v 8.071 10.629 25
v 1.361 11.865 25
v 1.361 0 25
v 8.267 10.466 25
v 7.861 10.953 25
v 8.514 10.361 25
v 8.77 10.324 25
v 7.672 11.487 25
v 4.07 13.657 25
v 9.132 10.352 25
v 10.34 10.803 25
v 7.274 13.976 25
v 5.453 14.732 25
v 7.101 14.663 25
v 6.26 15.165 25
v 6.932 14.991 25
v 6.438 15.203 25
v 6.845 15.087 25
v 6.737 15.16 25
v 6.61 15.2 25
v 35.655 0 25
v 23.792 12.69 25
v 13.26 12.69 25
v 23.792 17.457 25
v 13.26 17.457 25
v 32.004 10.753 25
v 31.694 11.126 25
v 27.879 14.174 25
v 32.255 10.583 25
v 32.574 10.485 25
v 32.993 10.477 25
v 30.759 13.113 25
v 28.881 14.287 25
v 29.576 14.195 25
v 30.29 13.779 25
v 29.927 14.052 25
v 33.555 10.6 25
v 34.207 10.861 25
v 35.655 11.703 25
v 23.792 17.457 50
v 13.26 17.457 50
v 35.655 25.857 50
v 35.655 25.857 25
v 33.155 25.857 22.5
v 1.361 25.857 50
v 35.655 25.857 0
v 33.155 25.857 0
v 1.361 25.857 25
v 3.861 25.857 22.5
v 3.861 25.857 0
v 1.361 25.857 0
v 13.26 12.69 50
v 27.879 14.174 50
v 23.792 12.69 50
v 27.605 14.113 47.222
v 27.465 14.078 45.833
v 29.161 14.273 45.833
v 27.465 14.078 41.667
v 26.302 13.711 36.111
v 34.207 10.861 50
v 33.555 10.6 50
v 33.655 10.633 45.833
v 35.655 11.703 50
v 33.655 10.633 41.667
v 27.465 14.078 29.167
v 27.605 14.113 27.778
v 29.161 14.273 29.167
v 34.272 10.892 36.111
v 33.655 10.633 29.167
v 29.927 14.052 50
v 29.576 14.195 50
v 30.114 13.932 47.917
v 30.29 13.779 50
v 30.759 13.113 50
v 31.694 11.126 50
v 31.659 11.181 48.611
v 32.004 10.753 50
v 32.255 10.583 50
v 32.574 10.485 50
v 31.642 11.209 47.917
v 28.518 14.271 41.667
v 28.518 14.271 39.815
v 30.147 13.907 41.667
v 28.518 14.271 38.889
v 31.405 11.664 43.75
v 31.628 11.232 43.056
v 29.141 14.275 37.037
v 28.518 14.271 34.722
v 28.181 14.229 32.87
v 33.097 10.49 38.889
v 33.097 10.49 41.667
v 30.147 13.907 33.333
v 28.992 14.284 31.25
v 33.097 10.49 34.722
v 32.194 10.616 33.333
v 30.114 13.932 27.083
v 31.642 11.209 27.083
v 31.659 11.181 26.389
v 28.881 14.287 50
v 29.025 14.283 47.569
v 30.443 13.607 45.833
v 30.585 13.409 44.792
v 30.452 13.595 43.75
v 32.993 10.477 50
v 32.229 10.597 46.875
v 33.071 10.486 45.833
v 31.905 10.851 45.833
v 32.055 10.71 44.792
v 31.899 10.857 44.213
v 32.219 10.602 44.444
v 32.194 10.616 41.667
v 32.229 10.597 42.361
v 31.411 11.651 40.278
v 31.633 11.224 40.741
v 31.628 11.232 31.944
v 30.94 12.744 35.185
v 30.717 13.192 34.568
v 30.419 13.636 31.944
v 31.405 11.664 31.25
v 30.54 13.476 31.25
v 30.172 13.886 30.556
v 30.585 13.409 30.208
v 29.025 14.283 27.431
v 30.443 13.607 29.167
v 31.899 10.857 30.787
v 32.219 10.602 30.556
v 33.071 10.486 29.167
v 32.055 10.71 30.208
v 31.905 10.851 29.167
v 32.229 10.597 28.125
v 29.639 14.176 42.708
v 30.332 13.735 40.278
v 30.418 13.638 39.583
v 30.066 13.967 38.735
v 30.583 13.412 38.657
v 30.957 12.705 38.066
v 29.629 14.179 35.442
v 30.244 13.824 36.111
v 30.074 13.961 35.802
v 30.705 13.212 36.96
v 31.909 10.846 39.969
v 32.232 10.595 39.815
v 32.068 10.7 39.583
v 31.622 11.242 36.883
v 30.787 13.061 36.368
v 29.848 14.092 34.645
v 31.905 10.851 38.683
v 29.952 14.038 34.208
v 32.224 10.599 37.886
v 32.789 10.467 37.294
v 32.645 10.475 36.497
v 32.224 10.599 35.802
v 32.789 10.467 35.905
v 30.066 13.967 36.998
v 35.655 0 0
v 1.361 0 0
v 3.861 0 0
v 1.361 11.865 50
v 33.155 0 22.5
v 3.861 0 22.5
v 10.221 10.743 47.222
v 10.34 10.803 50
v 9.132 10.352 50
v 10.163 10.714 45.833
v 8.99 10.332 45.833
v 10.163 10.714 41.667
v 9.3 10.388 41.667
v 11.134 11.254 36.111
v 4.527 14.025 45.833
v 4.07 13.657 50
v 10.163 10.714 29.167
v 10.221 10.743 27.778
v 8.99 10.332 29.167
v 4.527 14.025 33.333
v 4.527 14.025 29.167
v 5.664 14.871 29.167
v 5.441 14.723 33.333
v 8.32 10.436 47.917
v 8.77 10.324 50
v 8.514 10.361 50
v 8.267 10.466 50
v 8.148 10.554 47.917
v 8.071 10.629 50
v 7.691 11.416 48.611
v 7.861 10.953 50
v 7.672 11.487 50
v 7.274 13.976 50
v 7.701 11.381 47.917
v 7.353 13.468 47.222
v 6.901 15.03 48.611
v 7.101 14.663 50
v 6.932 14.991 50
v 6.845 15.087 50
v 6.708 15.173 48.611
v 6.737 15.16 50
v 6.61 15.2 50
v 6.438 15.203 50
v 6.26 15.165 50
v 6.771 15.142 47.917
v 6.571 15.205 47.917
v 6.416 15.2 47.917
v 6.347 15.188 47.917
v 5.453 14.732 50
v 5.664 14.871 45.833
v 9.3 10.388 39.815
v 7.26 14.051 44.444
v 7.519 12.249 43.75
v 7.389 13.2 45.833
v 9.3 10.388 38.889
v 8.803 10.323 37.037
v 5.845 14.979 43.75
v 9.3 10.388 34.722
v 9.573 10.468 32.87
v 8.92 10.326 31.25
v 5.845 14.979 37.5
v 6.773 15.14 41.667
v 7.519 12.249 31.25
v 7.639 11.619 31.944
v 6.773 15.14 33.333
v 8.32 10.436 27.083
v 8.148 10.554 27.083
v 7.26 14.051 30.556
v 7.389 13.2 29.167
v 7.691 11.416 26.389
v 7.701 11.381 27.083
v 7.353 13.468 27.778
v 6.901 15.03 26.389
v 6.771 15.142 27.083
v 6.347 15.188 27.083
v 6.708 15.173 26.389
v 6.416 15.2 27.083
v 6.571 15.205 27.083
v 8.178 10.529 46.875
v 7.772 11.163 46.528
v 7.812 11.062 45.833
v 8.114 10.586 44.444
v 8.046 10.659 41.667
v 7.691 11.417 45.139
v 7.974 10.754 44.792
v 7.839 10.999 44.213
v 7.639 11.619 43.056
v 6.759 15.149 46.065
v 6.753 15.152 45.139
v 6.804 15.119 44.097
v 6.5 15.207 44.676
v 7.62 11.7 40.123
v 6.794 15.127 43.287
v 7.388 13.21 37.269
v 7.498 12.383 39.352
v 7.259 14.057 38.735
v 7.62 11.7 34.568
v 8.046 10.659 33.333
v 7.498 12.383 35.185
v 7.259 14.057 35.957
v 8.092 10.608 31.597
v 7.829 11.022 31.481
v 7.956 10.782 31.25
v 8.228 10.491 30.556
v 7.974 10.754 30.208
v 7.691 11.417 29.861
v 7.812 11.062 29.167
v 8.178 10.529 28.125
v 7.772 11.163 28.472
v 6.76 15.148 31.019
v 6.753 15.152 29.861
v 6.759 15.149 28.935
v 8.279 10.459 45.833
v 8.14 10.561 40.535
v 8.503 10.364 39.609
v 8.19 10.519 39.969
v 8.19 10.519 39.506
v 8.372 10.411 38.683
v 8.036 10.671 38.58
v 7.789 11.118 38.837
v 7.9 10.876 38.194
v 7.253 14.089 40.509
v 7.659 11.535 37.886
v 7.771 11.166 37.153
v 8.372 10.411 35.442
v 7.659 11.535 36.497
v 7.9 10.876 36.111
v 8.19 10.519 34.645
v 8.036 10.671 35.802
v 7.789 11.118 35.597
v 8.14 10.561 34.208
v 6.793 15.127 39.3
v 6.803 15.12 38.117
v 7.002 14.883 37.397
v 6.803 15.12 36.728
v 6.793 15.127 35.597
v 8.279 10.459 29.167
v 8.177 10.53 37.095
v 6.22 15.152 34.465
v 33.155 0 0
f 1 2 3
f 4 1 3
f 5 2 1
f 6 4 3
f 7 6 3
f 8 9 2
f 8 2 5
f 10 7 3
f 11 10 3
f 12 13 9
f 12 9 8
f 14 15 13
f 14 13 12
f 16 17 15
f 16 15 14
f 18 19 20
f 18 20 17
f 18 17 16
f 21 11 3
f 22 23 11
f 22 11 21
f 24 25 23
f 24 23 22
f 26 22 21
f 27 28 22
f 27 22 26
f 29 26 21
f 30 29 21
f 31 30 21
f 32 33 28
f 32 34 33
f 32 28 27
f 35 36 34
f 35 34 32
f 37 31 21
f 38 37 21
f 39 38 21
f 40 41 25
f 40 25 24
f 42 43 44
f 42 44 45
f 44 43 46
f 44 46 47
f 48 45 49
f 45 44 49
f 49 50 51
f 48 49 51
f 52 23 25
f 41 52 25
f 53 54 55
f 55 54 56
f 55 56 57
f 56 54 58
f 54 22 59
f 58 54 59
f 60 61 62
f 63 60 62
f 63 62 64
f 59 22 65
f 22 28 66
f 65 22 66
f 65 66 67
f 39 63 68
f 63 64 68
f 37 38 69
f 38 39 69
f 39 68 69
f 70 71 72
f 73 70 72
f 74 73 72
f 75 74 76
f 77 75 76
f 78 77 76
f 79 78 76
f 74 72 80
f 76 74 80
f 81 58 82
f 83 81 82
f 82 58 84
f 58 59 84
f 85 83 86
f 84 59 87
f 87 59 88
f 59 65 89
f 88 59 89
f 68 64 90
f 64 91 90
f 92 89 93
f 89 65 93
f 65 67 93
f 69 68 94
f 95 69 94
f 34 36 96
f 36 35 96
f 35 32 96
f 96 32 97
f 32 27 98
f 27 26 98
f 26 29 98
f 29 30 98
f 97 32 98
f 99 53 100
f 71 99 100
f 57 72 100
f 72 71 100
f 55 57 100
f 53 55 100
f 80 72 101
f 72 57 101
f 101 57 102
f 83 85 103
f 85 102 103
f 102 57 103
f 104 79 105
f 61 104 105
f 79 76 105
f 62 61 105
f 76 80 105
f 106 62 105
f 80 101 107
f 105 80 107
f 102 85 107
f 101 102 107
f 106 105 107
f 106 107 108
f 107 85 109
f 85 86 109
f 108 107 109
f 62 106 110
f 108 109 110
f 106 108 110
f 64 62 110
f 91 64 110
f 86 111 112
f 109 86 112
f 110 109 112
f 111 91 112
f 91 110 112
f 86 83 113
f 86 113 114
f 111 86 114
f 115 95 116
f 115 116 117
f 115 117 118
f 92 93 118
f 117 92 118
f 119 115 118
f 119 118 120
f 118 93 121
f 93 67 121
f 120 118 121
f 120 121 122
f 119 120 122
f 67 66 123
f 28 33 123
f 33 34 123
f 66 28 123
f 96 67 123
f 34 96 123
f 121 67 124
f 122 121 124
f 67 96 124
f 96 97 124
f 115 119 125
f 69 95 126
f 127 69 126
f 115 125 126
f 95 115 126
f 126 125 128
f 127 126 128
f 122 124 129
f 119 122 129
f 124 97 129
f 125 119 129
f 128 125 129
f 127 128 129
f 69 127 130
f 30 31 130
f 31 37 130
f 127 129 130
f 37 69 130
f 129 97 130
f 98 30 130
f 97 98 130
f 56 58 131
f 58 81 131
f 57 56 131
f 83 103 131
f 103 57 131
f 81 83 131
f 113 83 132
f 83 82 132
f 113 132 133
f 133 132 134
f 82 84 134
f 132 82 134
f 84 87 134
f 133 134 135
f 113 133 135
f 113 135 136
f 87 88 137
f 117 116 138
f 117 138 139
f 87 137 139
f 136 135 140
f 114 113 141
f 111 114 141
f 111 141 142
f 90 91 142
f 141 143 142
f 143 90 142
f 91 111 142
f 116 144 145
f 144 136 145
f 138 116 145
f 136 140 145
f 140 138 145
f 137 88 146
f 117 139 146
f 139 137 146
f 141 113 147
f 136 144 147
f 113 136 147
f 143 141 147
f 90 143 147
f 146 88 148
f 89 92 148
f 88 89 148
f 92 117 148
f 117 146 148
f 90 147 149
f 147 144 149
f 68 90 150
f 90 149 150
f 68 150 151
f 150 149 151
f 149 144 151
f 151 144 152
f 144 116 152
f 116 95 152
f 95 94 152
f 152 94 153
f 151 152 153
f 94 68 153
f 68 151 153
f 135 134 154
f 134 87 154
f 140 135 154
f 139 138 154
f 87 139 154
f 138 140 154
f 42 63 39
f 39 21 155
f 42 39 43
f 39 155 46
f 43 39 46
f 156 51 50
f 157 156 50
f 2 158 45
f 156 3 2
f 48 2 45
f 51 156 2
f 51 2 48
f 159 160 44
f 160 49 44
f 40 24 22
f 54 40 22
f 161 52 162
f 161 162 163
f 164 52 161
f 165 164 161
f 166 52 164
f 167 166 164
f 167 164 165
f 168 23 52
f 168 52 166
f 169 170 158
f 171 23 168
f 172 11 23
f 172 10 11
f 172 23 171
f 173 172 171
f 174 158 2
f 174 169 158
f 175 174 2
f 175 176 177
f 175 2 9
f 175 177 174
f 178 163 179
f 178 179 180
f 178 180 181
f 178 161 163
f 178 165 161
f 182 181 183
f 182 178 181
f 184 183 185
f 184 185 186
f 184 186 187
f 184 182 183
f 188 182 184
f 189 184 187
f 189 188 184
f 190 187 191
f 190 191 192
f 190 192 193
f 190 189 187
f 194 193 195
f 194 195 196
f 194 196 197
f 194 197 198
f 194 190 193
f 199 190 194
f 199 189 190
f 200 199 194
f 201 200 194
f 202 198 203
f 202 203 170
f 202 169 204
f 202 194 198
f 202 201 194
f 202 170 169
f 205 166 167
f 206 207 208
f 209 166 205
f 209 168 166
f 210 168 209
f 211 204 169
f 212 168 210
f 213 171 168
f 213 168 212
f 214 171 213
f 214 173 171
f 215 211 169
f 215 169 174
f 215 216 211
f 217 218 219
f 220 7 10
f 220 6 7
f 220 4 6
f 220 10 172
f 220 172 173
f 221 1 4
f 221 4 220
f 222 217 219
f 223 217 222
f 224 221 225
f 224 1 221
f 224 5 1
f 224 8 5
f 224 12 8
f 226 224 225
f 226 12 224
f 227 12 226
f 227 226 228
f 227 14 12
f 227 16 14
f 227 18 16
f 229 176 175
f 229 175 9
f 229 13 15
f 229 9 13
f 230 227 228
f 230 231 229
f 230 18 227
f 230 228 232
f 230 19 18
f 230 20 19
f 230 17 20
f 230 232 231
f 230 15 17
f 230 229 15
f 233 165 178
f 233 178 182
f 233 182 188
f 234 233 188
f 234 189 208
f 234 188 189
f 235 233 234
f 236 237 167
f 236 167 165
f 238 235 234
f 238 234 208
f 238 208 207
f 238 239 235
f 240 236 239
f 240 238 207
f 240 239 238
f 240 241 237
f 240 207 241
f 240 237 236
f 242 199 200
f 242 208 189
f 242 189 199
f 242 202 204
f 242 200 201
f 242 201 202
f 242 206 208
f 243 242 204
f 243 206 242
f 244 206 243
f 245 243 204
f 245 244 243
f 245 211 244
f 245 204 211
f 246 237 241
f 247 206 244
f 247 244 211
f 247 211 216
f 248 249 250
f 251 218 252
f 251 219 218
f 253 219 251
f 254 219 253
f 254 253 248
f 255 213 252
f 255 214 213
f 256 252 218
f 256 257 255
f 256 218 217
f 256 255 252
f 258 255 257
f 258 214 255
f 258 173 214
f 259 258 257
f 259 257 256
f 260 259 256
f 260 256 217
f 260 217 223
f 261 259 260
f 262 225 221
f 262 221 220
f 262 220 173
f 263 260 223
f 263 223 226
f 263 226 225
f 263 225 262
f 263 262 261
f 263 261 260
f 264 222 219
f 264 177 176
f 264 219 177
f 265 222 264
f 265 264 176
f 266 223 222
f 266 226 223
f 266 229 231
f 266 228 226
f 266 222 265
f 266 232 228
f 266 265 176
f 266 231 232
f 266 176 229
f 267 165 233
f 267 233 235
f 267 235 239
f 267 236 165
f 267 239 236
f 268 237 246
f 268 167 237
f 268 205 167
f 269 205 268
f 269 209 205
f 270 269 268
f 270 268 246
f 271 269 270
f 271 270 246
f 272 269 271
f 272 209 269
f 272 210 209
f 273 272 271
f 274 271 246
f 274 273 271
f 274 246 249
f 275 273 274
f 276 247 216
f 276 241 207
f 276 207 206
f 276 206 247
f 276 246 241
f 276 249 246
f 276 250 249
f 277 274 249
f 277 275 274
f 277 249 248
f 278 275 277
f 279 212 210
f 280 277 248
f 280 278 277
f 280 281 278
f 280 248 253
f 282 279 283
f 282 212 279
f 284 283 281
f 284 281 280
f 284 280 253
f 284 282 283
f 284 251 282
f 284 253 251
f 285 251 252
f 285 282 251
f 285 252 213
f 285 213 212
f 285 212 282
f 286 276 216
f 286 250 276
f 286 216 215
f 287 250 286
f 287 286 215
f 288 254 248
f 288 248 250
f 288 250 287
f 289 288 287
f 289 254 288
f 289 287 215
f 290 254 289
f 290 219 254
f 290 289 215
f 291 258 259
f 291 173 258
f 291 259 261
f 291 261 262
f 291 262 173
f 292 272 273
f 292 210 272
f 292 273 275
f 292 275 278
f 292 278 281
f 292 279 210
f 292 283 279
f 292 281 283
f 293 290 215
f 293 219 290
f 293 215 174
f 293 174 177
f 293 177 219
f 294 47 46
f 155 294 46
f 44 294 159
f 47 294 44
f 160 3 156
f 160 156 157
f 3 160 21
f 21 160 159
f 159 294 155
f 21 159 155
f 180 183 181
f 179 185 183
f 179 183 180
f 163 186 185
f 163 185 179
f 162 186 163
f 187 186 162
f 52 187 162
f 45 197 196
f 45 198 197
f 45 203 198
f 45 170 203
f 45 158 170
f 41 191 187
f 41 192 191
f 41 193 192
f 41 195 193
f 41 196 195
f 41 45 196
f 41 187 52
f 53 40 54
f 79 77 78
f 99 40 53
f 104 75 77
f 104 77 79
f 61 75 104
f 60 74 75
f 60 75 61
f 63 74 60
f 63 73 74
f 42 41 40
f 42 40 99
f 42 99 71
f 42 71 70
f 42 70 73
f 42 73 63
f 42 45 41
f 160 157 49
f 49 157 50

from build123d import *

# Parameters (mm, degrees)
F0_W     = 34.2943547294
F0_H     = 25.8568562567
F1_DEPTH = 25
F2_T     = -2.5
F4_DEPTH = 25


with BuildPart() as f1:
    # F0 (on Top) → F1 (new body)
    with BuildSketch(Plane.XY):
        with Locations((18.5080640949, 12.9284281284)):
            Rectangle(F0_W, F0_H)
    extrude(amount=F1_DEPTH)

    # F2
    f2_openings = [f1.faces().sort_by_distance(p)[0] for p in [
        (18.508064, 25.856856, 12.5),
        (18.508064, 0, 12.5),
        (18.508064, 12.928428, 0),
    ]]
    offset(amount=F2_T, openings=f2_openings)

    # F3 (on face) → F4 (join)
    with BuildSketch(Plane.XY.offset(25)):
        with BuildLine():
            Line((13.2598066702, 17.4573864788), (23.7924046814, 17.4573864788))
            Line((23.7924046814, 17.4573864788), (23.7924046814, 12.689712923))
            add(Edge.make_bspline(
                [(23.7924046814, 12.689712923), (26.3508480961, 13.7881721519), (30.8893318732, 15.7367551698), (31.4069191474, 9.5192493209), (34.1874553016, 10.727986267), (35.6552414596, 11.7030631088)],
                knots=[0, 0, 0, 0, 0.343785498, 0.6098492922, 0.8257809177, 0.8257809177, 0.8257809177, 0.8257809177], degree=3))
            Line((35.6552414596, 11.7030631088), (35.6552414596, 25.8568562567))
            Line((35.6552414596, 25.8568562567), (1.3608867303, 25.8568562567))
            Line((1.3608867303, 25.8568562567), (1.3608867303, 11.8645355105))
            add(Edge.make_bspline(
                [(13.2598066702, 12.689712923), (11.0860272045, 11.1594255192), (6.9288496698, 8.2328745434), (7.8993387733, 18.2466111056), (3.4948427482, 12.7098239865), (1.3608867303, 11.8645355105)],
                knots=[0, 0, 0, 0, 0.2493304721, 0.476824376, 0.7419340081, 0.7419340081, 0.7419340081, 0.7419340081], degree=3))
            Line((13.2598066702, 12.689712923), (13.2598066702, 17.4573864788))
        make_face()
    extrude(amount=F4_DEPTH)


solid = f1.part
